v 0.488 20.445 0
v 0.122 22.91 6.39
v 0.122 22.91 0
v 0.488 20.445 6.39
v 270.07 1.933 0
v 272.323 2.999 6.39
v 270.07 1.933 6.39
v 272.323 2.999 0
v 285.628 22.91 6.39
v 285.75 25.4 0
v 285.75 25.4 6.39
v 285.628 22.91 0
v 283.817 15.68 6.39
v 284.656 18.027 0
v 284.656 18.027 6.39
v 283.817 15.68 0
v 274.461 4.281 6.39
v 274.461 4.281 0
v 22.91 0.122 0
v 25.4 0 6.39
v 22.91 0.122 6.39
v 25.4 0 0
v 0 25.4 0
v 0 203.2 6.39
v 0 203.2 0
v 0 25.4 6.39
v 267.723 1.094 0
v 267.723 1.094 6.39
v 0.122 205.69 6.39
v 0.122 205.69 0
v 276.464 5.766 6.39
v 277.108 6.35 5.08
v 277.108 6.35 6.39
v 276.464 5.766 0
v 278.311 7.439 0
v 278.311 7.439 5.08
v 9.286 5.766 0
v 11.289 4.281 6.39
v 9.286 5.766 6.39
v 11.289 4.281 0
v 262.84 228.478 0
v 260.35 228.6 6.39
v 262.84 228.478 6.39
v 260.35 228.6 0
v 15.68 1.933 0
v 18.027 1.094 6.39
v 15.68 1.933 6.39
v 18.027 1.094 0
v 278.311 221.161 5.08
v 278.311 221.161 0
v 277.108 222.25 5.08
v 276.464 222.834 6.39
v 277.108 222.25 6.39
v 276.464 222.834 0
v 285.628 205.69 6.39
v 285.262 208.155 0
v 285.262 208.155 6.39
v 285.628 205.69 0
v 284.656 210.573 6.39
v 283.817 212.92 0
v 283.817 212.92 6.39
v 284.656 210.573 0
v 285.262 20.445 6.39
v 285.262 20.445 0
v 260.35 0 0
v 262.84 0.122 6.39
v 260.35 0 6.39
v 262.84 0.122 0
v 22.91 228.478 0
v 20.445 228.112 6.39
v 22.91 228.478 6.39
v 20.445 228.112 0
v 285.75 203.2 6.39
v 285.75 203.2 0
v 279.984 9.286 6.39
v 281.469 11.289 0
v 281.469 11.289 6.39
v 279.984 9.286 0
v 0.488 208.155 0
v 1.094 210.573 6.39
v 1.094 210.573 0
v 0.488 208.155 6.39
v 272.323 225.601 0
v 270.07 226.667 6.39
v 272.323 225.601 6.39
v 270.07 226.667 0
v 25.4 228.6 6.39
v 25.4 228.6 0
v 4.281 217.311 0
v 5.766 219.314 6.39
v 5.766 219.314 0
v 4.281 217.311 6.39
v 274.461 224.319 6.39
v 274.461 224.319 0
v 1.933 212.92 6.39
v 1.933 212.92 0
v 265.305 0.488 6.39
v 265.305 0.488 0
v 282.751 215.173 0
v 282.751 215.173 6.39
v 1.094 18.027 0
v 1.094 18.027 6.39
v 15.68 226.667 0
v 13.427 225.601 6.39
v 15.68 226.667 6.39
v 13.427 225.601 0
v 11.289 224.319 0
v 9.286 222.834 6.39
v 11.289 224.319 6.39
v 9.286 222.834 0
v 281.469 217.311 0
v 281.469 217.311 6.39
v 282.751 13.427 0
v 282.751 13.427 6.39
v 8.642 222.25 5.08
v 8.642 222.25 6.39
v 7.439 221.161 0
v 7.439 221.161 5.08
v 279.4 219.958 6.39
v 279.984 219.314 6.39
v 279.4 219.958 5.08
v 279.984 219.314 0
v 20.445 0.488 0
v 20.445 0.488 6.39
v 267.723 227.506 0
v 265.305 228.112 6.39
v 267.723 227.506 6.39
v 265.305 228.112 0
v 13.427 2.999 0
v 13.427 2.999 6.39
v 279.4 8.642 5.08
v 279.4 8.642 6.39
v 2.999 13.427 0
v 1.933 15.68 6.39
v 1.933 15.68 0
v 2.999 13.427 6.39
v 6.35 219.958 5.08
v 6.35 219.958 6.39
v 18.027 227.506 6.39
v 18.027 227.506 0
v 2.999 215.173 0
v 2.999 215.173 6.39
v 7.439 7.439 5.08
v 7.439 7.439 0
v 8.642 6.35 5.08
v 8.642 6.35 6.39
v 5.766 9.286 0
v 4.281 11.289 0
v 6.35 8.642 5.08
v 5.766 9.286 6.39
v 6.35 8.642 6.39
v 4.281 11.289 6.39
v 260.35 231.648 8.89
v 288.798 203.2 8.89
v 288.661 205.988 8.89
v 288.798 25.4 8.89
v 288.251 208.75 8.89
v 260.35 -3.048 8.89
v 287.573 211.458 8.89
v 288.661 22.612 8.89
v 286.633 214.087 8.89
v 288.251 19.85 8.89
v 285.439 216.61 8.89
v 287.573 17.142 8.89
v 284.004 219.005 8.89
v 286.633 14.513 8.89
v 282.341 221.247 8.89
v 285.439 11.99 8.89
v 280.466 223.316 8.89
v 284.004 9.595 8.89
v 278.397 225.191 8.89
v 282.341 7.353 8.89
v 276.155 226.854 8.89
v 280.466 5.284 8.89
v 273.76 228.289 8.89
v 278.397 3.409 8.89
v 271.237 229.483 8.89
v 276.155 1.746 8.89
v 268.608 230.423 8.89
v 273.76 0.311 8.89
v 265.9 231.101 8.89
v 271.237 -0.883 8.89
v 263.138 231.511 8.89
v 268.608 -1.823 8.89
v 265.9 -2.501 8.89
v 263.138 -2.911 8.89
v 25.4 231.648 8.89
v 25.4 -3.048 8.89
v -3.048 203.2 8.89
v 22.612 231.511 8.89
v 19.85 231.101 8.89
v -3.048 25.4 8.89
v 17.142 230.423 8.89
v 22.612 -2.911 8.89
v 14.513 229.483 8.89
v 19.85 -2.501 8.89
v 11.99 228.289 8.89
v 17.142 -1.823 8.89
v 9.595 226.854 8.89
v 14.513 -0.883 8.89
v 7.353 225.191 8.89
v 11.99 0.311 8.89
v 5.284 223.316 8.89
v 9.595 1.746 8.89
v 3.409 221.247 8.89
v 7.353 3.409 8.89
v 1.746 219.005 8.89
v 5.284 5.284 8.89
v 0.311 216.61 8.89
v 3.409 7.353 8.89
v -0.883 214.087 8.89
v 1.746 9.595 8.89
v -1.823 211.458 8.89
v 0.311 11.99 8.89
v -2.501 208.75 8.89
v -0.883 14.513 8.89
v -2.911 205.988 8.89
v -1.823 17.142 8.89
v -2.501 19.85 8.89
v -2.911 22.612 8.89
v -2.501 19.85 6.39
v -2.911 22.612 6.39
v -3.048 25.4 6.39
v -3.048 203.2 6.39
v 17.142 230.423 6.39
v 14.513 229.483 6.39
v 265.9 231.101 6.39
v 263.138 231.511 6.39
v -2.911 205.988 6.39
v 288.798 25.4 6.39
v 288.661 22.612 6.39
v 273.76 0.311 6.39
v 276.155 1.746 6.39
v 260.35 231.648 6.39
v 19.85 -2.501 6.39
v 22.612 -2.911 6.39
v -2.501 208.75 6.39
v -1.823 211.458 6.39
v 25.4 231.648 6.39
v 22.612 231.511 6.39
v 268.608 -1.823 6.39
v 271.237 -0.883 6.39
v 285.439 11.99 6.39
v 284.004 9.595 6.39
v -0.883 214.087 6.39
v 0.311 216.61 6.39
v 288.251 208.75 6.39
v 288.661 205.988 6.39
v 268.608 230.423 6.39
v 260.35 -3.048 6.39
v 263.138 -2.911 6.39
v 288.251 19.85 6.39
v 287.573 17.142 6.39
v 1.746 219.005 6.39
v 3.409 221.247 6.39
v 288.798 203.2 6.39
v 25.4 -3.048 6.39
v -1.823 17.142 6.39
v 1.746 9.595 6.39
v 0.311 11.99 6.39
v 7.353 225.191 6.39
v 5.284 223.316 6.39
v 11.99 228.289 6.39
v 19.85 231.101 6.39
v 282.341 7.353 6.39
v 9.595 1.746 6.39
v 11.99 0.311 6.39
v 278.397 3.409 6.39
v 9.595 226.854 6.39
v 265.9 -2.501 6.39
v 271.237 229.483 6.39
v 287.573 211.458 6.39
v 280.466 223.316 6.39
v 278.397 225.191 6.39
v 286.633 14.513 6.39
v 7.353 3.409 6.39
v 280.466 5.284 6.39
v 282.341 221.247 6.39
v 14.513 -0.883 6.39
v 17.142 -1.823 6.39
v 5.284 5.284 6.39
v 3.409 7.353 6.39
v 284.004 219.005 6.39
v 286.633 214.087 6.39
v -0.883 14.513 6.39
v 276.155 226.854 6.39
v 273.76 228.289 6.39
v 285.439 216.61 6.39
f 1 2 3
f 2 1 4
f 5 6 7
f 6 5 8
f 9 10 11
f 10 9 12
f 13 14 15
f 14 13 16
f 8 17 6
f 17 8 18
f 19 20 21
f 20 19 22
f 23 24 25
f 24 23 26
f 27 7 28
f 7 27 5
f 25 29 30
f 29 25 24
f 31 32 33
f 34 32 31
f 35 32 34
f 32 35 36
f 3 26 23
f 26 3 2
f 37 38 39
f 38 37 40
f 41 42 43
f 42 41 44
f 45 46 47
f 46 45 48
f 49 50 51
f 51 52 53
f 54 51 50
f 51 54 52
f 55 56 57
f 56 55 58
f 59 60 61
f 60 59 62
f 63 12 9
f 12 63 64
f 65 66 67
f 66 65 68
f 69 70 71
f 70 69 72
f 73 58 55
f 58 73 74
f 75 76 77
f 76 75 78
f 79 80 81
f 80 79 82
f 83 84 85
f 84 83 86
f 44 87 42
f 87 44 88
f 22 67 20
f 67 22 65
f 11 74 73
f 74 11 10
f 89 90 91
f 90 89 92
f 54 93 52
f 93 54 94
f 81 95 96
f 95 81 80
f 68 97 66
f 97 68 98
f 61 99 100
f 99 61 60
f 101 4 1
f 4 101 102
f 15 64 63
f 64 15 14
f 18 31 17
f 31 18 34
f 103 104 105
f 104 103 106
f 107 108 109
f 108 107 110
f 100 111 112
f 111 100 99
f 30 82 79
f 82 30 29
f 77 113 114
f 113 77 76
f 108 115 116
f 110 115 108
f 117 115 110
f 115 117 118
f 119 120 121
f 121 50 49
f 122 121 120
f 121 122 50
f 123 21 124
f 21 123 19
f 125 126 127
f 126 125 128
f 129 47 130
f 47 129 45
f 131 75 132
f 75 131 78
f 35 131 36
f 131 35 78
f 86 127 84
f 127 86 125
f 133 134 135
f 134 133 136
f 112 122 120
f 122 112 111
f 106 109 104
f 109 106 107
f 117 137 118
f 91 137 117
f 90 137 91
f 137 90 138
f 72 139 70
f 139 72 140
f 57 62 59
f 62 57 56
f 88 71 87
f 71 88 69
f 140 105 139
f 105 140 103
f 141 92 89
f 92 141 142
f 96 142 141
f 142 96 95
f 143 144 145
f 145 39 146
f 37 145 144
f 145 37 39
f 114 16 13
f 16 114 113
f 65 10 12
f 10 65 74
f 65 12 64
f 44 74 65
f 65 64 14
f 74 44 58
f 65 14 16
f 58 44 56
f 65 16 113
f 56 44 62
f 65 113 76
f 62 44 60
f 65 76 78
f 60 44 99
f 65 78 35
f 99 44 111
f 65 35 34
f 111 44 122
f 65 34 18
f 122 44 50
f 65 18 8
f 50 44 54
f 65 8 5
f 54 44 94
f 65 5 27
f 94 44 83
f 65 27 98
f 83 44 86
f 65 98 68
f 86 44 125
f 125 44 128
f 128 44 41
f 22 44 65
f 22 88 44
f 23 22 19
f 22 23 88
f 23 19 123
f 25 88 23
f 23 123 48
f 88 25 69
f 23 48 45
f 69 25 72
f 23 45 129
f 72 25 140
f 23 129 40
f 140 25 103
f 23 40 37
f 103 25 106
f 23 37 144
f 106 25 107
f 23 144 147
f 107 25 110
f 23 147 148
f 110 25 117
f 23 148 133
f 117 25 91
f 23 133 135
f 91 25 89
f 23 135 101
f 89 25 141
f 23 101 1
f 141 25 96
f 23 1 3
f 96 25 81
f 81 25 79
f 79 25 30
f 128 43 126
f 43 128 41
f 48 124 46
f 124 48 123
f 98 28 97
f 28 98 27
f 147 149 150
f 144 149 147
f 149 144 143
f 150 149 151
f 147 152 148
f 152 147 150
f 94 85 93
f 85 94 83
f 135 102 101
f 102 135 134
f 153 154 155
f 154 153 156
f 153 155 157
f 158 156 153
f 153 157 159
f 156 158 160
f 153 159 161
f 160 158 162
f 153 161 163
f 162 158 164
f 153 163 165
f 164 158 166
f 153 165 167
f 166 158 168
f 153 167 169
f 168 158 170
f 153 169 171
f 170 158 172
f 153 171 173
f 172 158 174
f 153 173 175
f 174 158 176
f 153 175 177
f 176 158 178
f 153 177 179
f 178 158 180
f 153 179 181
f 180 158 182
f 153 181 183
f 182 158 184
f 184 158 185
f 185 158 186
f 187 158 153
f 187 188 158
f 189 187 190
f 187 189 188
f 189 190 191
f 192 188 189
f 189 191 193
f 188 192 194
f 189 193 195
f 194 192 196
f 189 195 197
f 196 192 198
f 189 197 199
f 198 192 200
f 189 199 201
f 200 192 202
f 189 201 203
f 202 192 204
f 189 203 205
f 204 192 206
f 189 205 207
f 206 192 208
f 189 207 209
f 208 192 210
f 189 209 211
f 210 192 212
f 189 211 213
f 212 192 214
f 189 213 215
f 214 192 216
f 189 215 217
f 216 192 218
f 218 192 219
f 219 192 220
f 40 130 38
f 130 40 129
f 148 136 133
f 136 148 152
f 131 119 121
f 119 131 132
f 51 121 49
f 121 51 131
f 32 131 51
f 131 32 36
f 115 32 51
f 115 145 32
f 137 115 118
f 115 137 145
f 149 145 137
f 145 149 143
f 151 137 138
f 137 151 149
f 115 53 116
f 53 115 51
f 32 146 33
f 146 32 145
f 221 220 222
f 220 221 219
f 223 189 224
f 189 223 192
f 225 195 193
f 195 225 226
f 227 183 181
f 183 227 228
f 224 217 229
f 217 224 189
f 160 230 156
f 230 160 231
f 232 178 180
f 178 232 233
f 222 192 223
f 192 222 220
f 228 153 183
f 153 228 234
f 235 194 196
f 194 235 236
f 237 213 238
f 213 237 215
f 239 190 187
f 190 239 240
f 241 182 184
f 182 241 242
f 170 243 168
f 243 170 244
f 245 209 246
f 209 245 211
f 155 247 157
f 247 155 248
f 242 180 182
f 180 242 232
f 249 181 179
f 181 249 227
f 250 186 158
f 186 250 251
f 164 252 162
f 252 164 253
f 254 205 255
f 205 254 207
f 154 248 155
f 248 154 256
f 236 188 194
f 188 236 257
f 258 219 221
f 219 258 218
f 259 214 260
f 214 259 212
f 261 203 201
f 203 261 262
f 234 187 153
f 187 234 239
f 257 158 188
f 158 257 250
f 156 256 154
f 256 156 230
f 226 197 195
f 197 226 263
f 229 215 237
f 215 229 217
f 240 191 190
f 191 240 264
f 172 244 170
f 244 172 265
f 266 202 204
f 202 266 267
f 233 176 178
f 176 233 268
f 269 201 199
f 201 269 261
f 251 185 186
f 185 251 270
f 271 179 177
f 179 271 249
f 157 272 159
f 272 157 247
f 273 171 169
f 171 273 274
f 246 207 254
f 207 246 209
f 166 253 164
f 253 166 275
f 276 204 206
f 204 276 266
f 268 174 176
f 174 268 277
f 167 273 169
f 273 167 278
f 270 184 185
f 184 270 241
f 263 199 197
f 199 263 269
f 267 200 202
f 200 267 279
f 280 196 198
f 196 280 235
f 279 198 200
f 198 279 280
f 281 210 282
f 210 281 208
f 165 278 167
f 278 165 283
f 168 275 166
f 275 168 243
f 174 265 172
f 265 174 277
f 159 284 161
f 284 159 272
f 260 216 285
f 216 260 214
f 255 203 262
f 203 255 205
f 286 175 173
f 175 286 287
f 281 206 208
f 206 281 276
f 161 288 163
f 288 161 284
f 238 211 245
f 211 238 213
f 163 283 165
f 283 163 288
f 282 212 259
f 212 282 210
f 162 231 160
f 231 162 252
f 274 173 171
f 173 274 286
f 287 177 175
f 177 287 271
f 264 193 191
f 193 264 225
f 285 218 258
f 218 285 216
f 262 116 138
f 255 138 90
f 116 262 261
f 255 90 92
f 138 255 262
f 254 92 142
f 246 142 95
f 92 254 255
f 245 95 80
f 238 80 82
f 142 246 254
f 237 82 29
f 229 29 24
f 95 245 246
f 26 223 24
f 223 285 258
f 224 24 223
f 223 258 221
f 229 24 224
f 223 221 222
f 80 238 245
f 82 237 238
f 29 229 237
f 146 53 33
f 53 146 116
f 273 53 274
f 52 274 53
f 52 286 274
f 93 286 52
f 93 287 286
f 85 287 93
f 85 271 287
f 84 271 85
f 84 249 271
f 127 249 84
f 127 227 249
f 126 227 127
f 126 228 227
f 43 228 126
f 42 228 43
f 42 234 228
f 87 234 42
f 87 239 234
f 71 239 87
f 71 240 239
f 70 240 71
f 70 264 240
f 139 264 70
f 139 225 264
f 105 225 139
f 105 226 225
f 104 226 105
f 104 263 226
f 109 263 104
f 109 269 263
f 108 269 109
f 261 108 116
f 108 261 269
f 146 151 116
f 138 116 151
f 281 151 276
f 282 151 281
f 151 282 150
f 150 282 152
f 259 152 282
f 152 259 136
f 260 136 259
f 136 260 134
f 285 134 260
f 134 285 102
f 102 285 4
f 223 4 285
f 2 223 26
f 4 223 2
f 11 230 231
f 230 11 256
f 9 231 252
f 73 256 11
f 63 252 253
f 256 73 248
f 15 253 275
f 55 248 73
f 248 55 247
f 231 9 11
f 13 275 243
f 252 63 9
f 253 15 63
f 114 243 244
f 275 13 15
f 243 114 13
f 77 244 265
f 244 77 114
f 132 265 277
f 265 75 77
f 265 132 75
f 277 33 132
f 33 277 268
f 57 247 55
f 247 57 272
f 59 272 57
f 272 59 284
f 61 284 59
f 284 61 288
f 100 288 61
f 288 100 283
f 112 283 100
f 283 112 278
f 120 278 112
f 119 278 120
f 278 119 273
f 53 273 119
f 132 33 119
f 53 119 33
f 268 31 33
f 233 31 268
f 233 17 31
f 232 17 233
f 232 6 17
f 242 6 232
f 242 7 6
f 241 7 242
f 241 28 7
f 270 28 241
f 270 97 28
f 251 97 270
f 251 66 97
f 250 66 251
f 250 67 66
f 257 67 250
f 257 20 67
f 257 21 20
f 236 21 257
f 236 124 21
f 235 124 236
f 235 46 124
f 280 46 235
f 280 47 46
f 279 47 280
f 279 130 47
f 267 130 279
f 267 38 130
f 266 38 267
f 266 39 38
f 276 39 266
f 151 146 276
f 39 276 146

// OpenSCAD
// file: model-forge/tray.scad
// model-forge/tray.scad — rounded-corner outer panel with a recessed
// inset pocket (e.g. a "cooking dish" recess): a raised rim around the
// edge, floor thickness under the pocket, and an optional thin lip
// flange around the base — sized to slide into a support-rail groove
// (like the wooden rails inside the real Tiny Land oven cavity) rather
// than just resting loose.
//
//   use <model-forge/tray.scad>
//   rounded_tray(outer_width=285.75, outer_height=228.6, corner_radius=25.4,
//                floor_thickness=5.08, rim_height=3.81, inset_margin=6.35,
//                lip_width=3, lip_thickness=2);
//
// Shape: outer_width x outer_height slab, rounded corners (corner_radius),
// total height = floor_thickness + rim_height. A pocket is cut from the
// top, inset_margin in from every edge, cutting down through rim_height
// and stopping at floor_thickness from the bottom — so floor_thickness is
// what's left under the pocket, rim_height is how tall the surrounding
// wall stands above the pocket floor.
//
// The lip (lip_width/lip_thickness) is a thin flange at the TOP of the
// rim (from total_height-lip_thickness to total_height), sticking out
// lip_width beyond the main body on every side — corrected 2026-09-11
// per feedback on the real rail photo: the groove is near the top of the
// cavity wall, not the bottom. Both default to 0 (no lip) so existing
// calls keep working unchanged.

// hull-of-4-circles rounded rect — much faster to render than a
// minkowski-based approach for this shape (no minkowski sum needed).
module rounded_rect_2d(w, h, r) {
  hull() {
    translate([r, r]) circle(r = r, $fn = 64);
    translate([w - r, r]) circle(r = r, $fn = 64);
    translate([r, h - r]) circle(r = r, $fn = 64);
    translate([w - r, h - r]) circle(r = r, $fn = 64);
  }
}

module rounded_tray(
  outer_width,
  outer_height,
  corner_radius,
  floor_thickness,
  rim_height,
  inset_margin,
  lip_width = 0,
  lip_thickness = 0
) {
  total_height = floor_thickness + rim_height;

  union() {
    if (lip_width > 0 && lip_thickness > 0) {
      translate([-lip_width, -lip_width, total_height - lip_thickness])
        linear_extrude(height = lip_thickness)
          rounded_rect_2d(outer_width + 2 * lip_width, outer_height + 2 * lip_width, corner_radius + lip_width);
    }
    difference() {
      linear_extrude(height = total_height)
        rounded_rect_2d(outer_width, outer_height, corner_radius);
      translate([inset_margin, inset_margin, floor_thickness])
        cube([outer_width - 2 * inset_margin, outer_height - 2 * inset_margin, rim_height + 1]);
    }
  }
}
// main file
// Tiny Land oven insert — cooking-dish tray. Standalone, printable file:
// swap the variables below, save, and re-export the STL (File > Export >
// Export as STL, or the CLI: openscad -o out.stl oven-tray.scad).
// View > Show Customizer for sliders.
use <model-forge/tray.scad>

/* [Size — inches] */
outer_width_in  = 11.25;
outer_height_in = 9;
corner_radius_in = 1;

/* [Pocket] */
floor_thickness_mm = 5.08; // [1:0.1:15]
rim_height_mm       = 3.81; // [1:0.1:15]
inset_margin_mm      = 6.35; // [1:0.1:25]

/* [Lip — slides into the oven cavity's support-rail groove] */
lip_width_in     = 0.12; // [0:0.01:1]  long (top/bottom) edges
end_lip_width_in = 0.5;  // [0:0.01:1]  short (left/right) edges
lip_thickness_mm = 2.5;  // [0.5:0.1:3]  must be <=3mm to fit the real rail; 2.5mm is the sweet spot

IN_TO_MM = 25.4;

rounded_tray(
  outer_width     = outer_width_in * IN_TO_MM,
  outer_height    = outer_height_in * IN_TO_MM,
  corner_radius   = corner_radius_in * IN_TO_MM,
  floor_thickness = floor_thickness_mm,
  rim_height      = rim_height_mm,
  inset_margin    = inset_margin_mm,
  lip_width       = lip_width_in * IN_TO_MM,
  end_lip_width   = end_lip_width_in * IN_TO_MM,
  lip_thickness   = lip_thickness_mm
);
